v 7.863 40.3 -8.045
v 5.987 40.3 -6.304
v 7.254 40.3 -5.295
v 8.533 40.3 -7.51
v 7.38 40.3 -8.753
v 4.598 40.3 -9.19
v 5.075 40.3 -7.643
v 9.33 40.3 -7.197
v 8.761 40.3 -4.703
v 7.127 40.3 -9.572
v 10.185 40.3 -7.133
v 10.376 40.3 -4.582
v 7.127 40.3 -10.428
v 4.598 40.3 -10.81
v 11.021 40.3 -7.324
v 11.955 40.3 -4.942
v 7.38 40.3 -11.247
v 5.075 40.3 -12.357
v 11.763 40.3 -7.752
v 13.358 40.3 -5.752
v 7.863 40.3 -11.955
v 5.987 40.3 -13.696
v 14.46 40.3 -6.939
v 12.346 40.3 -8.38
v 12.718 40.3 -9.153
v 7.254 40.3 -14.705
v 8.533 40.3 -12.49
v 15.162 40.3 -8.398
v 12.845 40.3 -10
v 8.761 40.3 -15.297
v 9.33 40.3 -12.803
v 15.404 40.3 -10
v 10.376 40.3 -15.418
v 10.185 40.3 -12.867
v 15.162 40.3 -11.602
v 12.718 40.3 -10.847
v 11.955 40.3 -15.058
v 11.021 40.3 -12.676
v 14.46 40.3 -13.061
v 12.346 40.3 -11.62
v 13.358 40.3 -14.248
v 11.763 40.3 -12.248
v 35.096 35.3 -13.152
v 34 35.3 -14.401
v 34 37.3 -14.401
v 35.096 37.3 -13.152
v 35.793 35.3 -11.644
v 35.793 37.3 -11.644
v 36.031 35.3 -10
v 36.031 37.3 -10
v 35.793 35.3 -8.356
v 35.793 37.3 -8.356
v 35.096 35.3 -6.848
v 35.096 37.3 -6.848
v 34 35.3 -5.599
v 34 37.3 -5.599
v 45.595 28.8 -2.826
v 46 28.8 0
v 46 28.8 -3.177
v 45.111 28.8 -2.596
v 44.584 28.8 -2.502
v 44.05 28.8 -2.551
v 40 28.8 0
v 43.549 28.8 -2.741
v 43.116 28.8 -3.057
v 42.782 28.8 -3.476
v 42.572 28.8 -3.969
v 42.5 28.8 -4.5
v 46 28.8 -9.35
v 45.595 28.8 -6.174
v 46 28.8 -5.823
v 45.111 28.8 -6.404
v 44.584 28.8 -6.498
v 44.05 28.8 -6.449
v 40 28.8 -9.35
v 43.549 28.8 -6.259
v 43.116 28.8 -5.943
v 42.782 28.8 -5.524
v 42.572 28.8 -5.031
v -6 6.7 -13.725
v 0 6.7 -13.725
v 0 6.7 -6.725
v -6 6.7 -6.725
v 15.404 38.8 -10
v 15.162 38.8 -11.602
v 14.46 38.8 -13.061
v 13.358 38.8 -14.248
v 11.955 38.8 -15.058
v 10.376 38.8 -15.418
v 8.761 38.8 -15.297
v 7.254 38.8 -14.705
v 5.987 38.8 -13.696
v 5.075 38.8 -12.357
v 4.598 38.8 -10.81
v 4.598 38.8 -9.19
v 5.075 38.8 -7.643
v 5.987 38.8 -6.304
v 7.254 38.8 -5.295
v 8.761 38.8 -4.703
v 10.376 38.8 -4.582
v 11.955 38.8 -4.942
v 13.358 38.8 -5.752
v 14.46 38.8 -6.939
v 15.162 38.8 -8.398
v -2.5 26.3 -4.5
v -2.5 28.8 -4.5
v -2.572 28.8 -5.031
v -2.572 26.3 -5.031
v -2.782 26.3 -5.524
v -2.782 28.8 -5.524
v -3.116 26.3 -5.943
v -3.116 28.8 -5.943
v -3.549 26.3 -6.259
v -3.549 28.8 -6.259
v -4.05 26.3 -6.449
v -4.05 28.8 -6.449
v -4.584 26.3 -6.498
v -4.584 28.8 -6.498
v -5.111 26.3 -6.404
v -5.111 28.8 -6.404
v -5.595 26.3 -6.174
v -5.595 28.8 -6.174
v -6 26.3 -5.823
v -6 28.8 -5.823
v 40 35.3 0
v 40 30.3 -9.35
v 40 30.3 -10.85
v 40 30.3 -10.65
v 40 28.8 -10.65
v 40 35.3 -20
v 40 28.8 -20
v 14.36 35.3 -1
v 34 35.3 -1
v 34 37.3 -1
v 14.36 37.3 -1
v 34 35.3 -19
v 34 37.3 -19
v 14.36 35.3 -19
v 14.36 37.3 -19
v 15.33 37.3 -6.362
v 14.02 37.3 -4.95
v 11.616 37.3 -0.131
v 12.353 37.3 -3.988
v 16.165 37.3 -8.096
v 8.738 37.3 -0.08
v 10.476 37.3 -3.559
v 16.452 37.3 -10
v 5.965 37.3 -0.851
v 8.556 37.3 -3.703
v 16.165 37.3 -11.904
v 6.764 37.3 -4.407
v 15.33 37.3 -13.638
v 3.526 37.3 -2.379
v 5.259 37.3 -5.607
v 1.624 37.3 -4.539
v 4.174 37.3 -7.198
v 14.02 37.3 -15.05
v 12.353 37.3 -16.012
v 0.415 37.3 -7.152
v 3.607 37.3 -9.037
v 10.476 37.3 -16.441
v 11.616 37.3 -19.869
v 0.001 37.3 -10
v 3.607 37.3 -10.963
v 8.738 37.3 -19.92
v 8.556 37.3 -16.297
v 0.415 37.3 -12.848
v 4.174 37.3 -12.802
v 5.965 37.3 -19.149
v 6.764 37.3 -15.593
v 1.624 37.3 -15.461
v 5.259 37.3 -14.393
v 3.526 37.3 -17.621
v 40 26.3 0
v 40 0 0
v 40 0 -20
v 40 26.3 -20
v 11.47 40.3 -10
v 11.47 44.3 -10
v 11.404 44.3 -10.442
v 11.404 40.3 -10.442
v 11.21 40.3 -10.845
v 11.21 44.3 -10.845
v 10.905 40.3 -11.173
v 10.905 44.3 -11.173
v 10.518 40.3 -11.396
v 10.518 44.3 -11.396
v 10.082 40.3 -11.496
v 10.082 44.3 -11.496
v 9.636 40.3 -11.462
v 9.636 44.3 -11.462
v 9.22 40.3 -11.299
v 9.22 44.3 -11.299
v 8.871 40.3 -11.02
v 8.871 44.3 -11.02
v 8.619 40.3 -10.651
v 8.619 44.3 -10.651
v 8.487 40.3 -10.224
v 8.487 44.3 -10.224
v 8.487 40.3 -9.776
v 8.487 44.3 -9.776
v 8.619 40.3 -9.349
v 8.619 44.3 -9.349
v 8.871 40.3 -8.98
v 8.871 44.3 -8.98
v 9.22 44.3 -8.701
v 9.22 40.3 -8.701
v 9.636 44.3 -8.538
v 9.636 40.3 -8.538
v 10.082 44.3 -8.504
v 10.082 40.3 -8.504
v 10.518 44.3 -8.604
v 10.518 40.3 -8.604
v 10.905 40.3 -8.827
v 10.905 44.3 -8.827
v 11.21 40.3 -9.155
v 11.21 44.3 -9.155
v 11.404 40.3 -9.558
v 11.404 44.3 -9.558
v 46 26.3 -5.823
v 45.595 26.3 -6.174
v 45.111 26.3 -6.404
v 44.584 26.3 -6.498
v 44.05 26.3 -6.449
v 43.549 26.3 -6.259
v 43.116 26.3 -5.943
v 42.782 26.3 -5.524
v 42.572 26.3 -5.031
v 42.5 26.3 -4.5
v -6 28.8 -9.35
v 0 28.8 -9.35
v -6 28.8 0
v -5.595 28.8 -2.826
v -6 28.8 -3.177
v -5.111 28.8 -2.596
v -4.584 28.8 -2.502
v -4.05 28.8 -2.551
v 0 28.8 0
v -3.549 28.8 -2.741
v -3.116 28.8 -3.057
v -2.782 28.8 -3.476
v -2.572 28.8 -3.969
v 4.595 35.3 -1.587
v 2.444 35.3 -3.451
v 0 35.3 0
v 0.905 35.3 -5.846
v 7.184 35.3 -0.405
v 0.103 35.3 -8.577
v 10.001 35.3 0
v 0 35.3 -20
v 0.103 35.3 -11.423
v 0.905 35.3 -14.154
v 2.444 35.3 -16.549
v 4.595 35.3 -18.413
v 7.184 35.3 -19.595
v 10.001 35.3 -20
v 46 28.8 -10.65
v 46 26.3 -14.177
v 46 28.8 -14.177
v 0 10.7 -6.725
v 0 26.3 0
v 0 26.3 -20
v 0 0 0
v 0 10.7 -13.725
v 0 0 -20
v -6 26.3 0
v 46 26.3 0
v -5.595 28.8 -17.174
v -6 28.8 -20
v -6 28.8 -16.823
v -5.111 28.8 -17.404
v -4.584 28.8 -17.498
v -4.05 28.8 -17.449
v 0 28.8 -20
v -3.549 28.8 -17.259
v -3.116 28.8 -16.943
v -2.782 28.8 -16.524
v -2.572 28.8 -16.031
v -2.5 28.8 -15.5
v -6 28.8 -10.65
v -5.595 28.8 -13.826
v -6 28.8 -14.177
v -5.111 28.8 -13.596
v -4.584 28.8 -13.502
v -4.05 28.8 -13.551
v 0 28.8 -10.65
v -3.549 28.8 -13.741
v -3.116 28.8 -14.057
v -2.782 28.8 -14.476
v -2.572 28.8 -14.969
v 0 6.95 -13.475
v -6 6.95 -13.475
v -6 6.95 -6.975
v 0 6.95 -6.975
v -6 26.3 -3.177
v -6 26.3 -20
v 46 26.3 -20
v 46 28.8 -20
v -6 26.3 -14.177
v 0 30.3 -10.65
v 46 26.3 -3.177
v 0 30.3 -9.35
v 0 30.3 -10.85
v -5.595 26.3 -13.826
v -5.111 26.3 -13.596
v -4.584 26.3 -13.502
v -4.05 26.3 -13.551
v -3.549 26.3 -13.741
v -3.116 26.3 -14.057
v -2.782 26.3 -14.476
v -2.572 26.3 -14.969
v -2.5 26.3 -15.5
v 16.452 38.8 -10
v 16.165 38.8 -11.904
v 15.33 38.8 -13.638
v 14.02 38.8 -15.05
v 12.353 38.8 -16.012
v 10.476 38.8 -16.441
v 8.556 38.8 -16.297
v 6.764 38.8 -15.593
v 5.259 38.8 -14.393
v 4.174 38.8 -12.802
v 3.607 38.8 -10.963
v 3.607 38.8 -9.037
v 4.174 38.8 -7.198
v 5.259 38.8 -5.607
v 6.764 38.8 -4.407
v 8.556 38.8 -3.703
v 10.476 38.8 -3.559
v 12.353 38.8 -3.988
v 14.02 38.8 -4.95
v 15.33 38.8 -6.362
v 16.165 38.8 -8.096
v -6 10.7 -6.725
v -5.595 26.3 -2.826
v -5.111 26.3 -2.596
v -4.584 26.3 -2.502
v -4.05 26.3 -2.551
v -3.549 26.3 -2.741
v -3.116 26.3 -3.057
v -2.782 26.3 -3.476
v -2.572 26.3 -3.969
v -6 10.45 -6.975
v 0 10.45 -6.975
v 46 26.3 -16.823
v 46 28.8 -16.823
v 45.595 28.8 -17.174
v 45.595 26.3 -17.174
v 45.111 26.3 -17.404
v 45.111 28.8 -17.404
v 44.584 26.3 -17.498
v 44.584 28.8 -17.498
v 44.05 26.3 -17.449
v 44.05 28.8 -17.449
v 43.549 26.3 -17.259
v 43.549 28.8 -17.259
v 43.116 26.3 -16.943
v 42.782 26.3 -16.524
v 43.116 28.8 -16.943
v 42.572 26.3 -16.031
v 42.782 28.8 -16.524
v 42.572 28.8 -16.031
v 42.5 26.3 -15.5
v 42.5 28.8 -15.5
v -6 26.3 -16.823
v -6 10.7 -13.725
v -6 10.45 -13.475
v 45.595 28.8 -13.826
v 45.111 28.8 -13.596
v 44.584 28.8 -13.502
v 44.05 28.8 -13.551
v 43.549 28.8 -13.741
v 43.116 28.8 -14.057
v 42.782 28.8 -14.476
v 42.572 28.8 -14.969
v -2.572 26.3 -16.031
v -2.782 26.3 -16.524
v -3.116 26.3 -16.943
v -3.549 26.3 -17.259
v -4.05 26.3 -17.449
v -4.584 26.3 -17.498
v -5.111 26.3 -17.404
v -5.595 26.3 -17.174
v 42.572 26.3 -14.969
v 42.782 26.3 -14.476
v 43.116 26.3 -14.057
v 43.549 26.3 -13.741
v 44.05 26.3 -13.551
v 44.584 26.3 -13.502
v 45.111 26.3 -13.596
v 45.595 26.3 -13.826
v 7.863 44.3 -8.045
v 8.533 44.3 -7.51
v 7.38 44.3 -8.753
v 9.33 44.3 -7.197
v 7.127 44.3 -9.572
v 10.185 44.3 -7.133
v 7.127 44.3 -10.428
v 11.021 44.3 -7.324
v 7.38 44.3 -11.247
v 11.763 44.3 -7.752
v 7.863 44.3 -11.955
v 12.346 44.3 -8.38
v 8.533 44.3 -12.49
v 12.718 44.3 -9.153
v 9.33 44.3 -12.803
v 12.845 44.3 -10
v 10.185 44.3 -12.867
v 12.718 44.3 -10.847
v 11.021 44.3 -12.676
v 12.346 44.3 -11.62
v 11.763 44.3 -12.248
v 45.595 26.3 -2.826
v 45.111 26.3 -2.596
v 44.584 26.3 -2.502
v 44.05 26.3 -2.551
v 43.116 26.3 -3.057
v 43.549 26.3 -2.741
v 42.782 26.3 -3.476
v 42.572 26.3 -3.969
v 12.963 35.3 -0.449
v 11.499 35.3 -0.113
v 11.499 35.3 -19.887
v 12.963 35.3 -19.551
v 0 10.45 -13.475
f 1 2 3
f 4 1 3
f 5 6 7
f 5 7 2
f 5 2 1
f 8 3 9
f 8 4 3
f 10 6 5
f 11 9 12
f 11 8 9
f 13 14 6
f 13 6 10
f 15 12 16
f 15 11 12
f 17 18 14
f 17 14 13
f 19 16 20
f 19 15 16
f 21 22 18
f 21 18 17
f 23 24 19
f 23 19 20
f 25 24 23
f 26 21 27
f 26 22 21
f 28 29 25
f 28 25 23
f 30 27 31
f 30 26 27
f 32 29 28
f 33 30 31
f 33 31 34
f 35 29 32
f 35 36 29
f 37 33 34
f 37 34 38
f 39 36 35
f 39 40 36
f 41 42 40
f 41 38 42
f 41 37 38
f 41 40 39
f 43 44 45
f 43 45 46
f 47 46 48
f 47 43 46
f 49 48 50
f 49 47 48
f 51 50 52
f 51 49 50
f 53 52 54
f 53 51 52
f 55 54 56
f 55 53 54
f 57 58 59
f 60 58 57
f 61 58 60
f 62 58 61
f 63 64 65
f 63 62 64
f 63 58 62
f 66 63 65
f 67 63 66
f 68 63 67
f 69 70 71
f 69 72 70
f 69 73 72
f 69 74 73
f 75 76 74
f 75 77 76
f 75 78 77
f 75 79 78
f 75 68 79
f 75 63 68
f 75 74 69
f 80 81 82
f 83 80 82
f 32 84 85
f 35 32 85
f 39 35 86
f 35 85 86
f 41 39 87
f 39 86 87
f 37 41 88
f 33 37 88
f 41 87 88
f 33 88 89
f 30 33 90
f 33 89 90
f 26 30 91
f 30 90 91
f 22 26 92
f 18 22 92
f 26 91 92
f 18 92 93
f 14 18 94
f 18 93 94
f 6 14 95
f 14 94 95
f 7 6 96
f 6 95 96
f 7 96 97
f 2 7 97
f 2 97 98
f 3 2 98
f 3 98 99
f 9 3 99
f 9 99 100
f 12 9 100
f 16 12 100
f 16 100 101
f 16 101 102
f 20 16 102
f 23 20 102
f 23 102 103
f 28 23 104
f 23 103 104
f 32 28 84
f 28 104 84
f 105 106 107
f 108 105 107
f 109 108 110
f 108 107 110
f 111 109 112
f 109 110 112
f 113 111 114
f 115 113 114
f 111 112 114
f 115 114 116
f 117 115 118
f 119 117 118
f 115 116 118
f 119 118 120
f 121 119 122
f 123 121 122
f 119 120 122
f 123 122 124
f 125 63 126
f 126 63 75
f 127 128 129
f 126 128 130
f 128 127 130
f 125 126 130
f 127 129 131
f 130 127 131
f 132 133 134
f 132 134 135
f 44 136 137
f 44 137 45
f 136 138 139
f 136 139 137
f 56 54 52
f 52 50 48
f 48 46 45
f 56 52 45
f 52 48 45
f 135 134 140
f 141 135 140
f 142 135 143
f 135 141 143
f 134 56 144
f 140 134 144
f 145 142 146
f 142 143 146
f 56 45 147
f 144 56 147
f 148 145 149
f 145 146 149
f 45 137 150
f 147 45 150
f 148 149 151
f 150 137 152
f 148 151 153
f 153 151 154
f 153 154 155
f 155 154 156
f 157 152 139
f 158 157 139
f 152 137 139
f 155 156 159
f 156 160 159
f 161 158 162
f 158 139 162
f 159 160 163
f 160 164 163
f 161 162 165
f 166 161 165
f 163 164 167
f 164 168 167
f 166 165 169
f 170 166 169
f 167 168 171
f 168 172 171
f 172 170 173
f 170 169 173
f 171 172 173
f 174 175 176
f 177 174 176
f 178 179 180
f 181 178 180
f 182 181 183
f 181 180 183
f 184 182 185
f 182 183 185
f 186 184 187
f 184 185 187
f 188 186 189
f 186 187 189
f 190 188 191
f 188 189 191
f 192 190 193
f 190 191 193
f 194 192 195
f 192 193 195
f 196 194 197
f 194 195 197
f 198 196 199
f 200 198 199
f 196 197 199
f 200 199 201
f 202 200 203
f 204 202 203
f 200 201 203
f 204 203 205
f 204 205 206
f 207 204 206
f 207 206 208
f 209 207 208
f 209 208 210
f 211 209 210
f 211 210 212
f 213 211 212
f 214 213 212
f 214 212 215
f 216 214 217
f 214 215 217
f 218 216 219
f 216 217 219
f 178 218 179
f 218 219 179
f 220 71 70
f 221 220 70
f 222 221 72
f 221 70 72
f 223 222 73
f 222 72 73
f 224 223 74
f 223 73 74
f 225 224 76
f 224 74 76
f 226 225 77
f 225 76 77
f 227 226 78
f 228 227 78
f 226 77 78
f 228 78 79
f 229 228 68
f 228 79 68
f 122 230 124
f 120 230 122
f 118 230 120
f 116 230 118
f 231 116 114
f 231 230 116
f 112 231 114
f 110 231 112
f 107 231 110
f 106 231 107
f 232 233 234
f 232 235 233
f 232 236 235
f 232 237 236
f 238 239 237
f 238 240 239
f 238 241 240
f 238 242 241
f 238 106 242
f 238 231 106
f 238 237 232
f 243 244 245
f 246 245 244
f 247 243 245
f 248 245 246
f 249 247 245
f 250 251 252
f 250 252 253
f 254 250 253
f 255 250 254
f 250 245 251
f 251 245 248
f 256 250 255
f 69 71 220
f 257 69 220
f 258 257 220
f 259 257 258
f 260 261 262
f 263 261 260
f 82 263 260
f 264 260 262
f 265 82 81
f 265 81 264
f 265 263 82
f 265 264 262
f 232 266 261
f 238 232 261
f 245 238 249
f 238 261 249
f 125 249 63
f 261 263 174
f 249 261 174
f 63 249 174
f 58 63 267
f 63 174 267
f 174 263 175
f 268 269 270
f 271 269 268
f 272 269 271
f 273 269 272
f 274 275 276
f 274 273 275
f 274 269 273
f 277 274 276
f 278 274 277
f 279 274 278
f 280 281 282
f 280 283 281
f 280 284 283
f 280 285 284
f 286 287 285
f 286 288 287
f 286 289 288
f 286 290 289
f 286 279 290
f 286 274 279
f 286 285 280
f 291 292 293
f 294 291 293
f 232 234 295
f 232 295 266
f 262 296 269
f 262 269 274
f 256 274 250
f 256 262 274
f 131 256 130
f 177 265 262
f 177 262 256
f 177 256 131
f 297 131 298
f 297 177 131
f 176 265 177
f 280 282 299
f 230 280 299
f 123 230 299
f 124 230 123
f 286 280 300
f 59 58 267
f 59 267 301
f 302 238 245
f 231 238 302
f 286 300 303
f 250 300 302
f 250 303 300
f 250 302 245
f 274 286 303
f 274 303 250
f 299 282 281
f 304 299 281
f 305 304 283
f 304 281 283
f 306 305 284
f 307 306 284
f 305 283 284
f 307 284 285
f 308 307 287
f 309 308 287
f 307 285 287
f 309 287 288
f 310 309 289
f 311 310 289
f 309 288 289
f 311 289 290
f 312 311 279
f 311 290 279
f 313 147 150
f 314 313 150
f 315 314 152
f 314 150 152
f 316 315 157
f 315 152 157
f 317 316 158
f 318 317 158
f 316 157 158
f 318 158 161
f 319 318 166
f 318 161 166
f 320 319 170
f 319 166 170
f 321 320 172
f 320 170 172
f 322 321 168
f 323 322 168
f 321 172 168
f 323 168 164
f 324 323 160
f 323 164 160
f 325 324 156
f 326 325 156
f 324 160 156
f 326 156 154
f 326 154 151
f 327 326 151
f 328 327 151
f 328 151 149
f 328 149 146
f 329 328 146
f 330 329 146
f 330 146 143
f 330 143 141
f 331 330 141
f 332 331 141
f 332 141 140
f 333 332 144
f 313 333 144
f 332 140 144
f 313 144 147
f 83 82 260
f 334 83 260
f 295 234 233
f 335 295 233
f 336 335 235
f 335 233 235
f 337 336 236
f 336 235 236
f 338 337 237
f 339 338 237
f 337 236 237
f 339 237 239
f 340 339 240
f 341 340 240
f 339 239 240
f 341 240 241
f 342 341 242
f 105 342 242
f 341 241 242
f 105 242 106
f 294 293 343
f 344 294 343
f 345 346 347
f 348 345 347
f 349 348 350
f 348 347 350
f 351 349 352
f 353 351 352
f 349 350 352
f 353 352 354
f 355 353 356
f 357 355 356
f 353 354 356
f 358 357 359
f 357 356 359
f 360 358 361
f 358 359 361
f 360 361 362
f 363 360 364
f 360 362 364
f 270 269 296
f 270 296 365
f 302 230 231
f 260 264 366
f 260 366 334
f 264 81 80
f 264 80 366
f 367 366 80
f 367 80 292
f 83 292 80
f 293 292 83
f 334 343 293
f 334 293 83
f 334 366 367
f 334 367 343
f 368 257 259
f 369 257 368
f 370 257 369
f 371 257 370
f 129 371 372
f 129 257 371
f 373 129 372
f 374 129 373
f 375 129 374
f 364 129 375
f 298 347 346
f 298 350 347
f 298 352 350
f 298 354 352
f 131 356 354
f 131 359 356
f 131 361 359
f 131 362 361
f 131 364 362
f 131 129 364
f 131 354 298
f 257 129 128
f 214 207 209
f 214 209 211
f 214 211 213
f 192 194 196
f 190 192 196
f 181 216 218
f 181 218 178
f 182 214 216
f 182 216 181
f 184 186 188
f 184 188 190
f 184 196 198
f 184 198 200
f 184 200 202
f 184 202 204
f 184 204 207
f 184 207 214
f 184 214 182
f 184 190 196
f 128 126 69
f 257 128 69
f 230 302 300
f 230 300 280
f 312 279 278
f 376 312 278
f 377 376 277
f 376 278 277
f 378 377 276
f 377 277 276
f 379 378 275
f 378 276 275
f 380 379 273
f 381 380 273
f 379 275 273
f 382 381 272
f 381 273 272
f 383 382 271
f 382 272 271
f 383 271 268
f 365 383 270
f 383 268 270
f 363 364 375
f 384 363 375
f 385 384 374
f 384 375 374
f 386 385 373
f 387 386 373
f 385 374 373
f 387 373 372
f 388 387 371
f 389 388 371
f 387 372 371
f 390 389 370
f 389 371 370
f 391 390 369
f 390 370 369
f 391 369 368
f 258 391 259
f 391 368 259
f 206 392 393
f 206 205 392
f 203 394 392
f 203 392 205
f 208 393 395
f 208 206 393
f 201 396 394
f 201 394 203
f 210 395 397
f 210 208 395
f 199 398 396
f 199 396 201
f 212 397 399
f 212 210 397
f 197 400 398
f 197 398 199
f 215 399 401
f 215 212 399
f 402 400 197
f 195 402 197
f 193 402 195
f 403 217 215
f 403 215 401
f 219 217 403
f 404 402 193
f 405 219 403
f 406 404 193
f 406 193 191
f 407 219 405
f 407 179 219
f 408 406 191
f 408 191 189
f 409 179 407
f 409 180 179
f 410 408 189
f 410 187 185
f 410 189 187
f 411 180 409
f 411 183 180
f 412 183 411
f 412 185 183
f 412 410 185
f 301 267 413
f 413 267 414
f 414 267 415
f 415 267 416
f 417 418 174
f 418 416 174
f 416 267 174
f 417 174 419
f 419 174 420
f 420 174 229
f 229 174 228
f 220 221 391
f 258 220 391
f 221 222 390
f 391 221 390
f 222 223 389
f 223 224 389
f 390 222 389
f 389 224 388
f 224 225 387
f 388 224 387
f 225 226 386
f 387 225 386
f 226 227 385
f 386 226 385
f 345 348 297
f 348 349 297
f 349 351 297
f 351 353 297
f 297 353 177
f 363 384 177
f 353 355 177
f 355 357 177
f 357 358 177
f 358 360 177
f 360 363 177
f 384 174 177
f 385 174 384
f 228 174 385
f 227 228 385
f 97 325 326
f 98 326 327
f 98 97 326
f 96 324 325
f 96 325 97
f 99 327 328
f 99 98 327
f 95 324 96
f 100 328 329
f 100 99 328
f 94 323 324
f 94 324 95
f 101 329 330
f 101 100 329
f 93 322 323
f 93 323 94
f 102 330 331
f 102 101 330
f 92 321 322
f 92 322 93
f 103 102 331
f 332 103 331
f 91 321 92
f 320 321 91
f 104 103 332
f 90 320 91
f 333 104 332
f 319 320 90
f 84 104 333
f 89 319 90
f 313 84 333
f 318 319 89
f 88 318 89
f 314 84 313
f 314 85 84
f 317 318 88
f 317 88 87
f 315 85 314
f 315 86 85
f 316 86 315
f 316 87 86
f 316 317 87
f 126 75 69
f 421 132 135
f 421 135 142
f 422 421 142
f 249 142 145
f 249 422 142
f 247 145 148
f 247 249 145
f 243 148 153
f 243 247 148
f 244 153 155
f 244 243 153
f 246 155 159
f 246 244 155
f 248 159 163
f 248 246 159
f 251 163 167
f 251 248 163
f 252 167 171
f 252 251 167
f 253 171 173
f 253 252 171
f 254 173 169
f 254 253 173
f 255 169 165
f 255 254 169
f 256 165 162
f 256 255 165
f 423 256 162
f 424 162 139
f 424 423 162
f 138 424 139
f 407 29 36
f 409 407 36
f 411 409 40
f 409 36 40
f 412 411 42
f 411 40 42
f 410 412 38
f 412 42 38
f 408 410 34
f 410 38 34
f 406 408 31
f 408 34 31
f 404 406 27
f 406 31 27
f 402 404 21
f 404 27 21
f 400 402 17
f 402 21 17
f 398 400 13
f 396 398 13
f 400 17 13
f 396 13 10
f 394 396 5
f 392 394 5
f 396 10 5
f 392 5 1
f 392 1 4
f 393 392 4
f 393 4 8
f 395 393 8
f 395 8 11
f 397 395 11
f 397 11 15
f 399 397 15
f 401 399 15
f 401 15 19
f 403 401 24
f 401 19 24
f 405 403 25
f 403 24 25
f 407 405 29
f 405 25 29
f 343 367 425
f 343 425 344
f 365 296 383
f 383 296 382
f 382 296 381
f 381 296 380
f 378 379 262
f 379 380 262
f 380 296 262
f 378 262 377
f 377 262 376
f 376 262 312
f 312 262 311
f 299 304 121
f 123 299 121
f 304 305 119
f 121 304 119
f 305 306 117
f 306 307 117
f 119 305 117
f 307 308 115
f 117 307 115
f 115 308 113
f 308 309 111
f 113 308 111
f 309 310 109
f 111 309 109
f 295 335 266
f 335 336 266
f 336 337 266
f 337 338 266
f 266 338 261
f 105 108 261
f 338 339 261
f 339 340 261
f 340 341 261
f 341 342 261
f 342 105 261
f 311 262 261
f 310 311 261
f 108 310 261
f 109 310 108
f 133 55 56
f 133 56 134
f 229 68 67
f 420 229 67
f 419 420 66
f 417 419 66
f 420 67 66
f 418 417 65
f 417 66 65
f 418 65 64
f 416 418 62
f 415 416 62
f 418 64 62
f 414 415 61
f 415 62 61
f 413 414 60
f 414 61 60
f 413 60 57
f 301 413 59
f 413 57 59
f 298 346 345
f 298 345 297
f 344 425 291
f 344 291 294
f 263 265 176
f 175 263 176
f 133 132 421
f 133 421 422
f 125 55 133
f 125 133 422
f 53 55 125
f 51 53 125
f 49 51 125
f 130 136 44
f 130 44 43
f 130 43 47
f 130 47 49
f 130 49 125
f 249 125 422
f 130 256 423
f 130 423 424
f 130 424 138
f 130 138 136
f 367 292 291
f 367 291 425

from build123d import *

# Parameters (mm, degrees)
SKETCH1_W            = 40
SKETCH1_H            = 20
BOSS_EXTRUDE1_DEPTH  = 35.3
BOSS_EXTRUDE2_DEPTH  = 2
SKETCH3_R            = 6.458580866
BOSS_EXTRUDE3_DEPTH  = 1.5
SKETCH4_R            = 5.433415679
BOSS_EXTRUDE4_DEPTH  = 1.5
SKETCH5_R            = 2.875
BOSS_EXTRUDE5_DEPTH  = 4
SKETCH6_W            = 20
SKETCH6_H            = 2.5
BOSS_EXTRUDE6_DEPTH  = 6
CUT_EXTRUDE1_DEPTH   = 7
SKETCH8_W            = 20
SKETCH8_H            = 2.5
BOSS_EXTRUDE7_DEPTH  = 6
CUT_EXTRUDE2_DEPTH   = 7
SKETCH11_W           = 7
SKETCH11_H           = 4
BOSS_EXTRUDE8_DEPTH  = 6
SKETCH12_W           = 6.5
SKETCH12_H           = 3.5
CUT_EXTRUDE3_DEPTH   = 6
SKETCH13_W           = 6
SKETCH13_H           = 1.3
BOSS_EXTRUDE9_DEPTH  = 1.5
SKETCH14_W           = 6
SKETCH14_H           = 1.3
BOSS_EXTRUDE10_DEPTH = 1.5
CUT_EXTRUDE4_DEPTH   = 1.5
CUT_EXTRUDE5_DEPTH   = 1.5
SKETCH17_R           = 1.5
CUT_EXTRUDE6_DEPTH   = 4


with BuildPart() as part:
    # Sketch1 → Boss-Extrude1 (new body)
    with BuildSketch(Plane(origin=(0, 0, 0), x_dir=(1, 0, 0), z_dir=(0, 1, 0))):
        with Locations((20, 10)):
            Rectangle(SKETCH1_W, SKETCH1_H)
    extrude(amount=BOSS_EXTRUDE1_DEPTH)

    # Sketch2 → Boss-Extrude2 (add)
    with BuildSketch(Plane(origin=(0, 35.3, 0), x_dir=(1, 0, 0), z_dir=(0, 1, 0))):
        with BuildLine():
            Line((34, 5.599382986), (34, 1))
            Line((34, 1), (14.359898944, 1))
            ThreePointArc((14.359898944, 1), (0.001, 10), (14.359898944, 19))
            Line((14.359898944, 19), (34, 19))
            Line((34, 19), (34, 14.400617014))
            ThreePointArc((34, 14.400617014), (36.031185557, 10), (34, 5.599382986))
        make_face()
    extrude(amount=BOSS_EXTRUDE2_DEPTH)

    # Sketch3 → Boss-Extrude3 (add)
    with BuildSketch(Plane(origin=(0, 37.3, 0), x_dir=(1, 0, 0), z_dir=(0, 1, 0))):
        with Locations((9.993186342, 10)):
            Circle(SKETCH3_R)
    extrude(amount=BOSS_EXTRUDE3_DEPTH)

    # Sketch4 → Boss-Extrude4 (add)
    with BuildSketch(Plane(origin=(0, 38.8, 0), x_dir=(1, 0, 0), z_dir=(0, 1, 0))):
        with Locations((9.970242147, 10)):
            Circle(SKETCH4_R)
    extrude(amount=BOSS_EXTRUDE4_DEPTH)

    # Sketch5 → Boss-Extrude5 (add)
    with BuildSketch(Plane(origin=(0, 40.3, 0), x_dir=(1, 0, 0), z_dir=(0, 1, 0))):
        with Locations((9.970242147, 10)):
            Circle(SKETCH5_R)
    extrude(amount=BOSS_EXTRUDE5_DEPTH)

    # Sketch6 → Boss-Extrude6 (add)
    with BuildSketch(Plane(origin=(40, 0, 0), x_dir=(0, 0, -1), z_dir=(1, 0, 0))):
        with Locations((10, 27.55)):
            Rectangle(SKETCH6_W, SKETCH6_H)
    extrude(amount=BOSS_EXTRUDE6_DEPTH)

    # Sketch7 → Cut-Extrude1 (cut)
    with BuildSketch(Plane(origin=(0, 28.8, 0), x_dir=(1, 0, 0), z_dir=(0, 1, 0))):
        with BuildLine():
            ThreePointArc((46, 3.177124344), (46.370828693, 3.792893219), (46.5, 4.5))
            ThreePointArc((46.5, 4.5), (46.370828693, 5.207106781), (46, 5.822875656))
            Line((46, 5.822875656), (46, 3.177124344))
        make_face()
        with BuildLine():
            Line((46, 3.177124344), (46, 5.822875656))
            ThreePointArc((46, 5.822875656), (43.792893219, 6.370828693), (42.5, 4.5))
            ThreePointArc((42.5, 4.5), (43.792893219, 2.629171307), (46, 3.177124344))
        make_face()
        with BuildLine():
            ThreePointArc((42.5, 15.5), (43.792893219, 13.629171307), (46, 14.177124344))
            Line((46, 14.177124344), (46, 16.822875656))
            ThreePointArc((46, 16.822875656), (43.792893219, 17.370828693), (42.5, 15.5))
        make_face()
        with BuildLine():
            Line((46, 16.822875656), (46, 14.177124344))
            ThreePointArc((46, 14.177124344), (46.370828693, 14.792893219), (46.5, 15.5))
            ThreePointArc((46.5, 15.5), (46.370828693, 16.207106781), (46, 16.822875656))
        make_face()
    extrude(amount=-CUT_EXTRUDE1_DEPTH, mode=Mode.SUBTRACT)

    # Sketch8 → Boss-Extrude7 (add)
    with BuildSketch(Plane.ZY):
        with Locations((-10, 27.55)):
            Rectangle(SKETCH8_W, SKETCH8_H)
    extrude(amount=BOSS_EXTRUDE7_DEPTH)

    # Sketch9 → Cut-Extrude2 (cut)
    with BuildSketch(Plane(origin=(0, 28.8, 0), x_dir=(1, 0, 0), z_dir=(0, 1, 0))):
        with BuildLine():
            ThreePointArc((-6, 14.177124344), (-3.792893219, 13.629171307), (-2.5, 15.5))
            ThreePointArc((-2.5, 15.5), (-3.792893219, 17.370828693), (-6, 16.822875656))
            Line((-6, 16.822875656), (-6, 14.177124344))
        make_face()
        with BuildLine():
            Line((-6, 14.177124344), (-6, 16.822875656))
            ThreePointArc((-6, 16.822875656), (-6.5, 15.5), (-6, 14.177124344))
        make_face()
        with BuildLine():
            ThreePointArc((-2.5, 4.5), (-3.792893219, 6.370828693), (-6, 5.822875656))
            Line((-6, 5.822875656), (-6, 3.177124344))
            ThreePointArc((-6, 3.177124344), (-3.792893219, 2.629171307), (-2.5, 4.5))
        make_face()
        with BuildLine():
            Line((-6, 3.177124344), (-6, 5.822875656))
            ThreePointArc((-6, 5.822875656), (-6.5, 4.5), (-6, 3.177124344))
        make_face()
    extrude(amount=-CUT_EXTRUDE2_DEPTH, mode=Mode.SUBTRACT)

    # Sketch11 → Boss-Extrude8 (add)
    with BuildSketch(Plane.ZY):
        with Locations((-10.225128457, 8.7)):
            Rectangle(SKETCH11_W, SKETCH11_H)
    extrude(amount=BOSS_EXTRUDE8_DEPTH)

    # Sketch12 → Cut-Extrude3 (cut)
    with BuildSketch(Plane.ZY.offset(6)):
        with Locations((-10.225128457, 8.7)):
            Rectangle(SKETCH12_W, SKETCH12_H)
    extrude(amount=-CUT_EXTRUDE3_DEPTH, mode=Mode.SUBTRACT)

    # Sketch13 → Boss-Extrude9 (add)
    with BuildSketch(Plane(origin=(0, 28.8, 0), x_dir=(1, 0, 0), z_dir=(0, 1, 0))):
        with Locations((43, 10)):
            Rectangle(SKETCH13_W, SKETCH13_H)
    extrude(amount=BOSS_EXTRUDE9_DEPTH)

    # Sketch14 → Boss-Extrude10 (add)
    with BuildSketch(Plane(origin=(0, 28.8, 0), x_dir=(1, 0, 0), z_dir=(0, 1, 0))):
        with Locations((-3, 10)):
            Rectangle(SKETCH14_W, SKETCH14_H)
    extrude(amount=BOSS_EXTRUDE10_DEPTH)

    # Sketch15 → Cut-Extrude4 (cut)
    with BuildSketch(Plane.XY.offset(-9.35)):
        Polygon((40, 30.3), (46, 28.8), (46, 30.3), align=None)
    extrude(amount=-CUT_EXTRUDE4_DEPTH, mode=Mode.SUBTRACT)

    # Sketch16 → Cut-Extrude5 (cut)
    with BuildSketch(Plane.XY.offset(-9.35)):
        Polygon((-6, 28.8), (-6, 30.3), (0, 30.3), align=None)
    extrude(amount=-CUT_EXTRUDE5_DEPTH, mode=Mode.SUBTRACT)

    # Sketch17 → Cut-Extrude6 (cut)
    with BuildSketch(Plane(origin=(0, 44.3, 0), x_dir=(1, 0, 0), z_dir=(0, 1, 0))):
        with Locations((9.970242147, 10)):
            Circle(SKETCH17_R)
    extrude(amount=-CUT_EXTRUDE6_DEPTH, mode=Mode.SUBTRACT)


solid = part.part
